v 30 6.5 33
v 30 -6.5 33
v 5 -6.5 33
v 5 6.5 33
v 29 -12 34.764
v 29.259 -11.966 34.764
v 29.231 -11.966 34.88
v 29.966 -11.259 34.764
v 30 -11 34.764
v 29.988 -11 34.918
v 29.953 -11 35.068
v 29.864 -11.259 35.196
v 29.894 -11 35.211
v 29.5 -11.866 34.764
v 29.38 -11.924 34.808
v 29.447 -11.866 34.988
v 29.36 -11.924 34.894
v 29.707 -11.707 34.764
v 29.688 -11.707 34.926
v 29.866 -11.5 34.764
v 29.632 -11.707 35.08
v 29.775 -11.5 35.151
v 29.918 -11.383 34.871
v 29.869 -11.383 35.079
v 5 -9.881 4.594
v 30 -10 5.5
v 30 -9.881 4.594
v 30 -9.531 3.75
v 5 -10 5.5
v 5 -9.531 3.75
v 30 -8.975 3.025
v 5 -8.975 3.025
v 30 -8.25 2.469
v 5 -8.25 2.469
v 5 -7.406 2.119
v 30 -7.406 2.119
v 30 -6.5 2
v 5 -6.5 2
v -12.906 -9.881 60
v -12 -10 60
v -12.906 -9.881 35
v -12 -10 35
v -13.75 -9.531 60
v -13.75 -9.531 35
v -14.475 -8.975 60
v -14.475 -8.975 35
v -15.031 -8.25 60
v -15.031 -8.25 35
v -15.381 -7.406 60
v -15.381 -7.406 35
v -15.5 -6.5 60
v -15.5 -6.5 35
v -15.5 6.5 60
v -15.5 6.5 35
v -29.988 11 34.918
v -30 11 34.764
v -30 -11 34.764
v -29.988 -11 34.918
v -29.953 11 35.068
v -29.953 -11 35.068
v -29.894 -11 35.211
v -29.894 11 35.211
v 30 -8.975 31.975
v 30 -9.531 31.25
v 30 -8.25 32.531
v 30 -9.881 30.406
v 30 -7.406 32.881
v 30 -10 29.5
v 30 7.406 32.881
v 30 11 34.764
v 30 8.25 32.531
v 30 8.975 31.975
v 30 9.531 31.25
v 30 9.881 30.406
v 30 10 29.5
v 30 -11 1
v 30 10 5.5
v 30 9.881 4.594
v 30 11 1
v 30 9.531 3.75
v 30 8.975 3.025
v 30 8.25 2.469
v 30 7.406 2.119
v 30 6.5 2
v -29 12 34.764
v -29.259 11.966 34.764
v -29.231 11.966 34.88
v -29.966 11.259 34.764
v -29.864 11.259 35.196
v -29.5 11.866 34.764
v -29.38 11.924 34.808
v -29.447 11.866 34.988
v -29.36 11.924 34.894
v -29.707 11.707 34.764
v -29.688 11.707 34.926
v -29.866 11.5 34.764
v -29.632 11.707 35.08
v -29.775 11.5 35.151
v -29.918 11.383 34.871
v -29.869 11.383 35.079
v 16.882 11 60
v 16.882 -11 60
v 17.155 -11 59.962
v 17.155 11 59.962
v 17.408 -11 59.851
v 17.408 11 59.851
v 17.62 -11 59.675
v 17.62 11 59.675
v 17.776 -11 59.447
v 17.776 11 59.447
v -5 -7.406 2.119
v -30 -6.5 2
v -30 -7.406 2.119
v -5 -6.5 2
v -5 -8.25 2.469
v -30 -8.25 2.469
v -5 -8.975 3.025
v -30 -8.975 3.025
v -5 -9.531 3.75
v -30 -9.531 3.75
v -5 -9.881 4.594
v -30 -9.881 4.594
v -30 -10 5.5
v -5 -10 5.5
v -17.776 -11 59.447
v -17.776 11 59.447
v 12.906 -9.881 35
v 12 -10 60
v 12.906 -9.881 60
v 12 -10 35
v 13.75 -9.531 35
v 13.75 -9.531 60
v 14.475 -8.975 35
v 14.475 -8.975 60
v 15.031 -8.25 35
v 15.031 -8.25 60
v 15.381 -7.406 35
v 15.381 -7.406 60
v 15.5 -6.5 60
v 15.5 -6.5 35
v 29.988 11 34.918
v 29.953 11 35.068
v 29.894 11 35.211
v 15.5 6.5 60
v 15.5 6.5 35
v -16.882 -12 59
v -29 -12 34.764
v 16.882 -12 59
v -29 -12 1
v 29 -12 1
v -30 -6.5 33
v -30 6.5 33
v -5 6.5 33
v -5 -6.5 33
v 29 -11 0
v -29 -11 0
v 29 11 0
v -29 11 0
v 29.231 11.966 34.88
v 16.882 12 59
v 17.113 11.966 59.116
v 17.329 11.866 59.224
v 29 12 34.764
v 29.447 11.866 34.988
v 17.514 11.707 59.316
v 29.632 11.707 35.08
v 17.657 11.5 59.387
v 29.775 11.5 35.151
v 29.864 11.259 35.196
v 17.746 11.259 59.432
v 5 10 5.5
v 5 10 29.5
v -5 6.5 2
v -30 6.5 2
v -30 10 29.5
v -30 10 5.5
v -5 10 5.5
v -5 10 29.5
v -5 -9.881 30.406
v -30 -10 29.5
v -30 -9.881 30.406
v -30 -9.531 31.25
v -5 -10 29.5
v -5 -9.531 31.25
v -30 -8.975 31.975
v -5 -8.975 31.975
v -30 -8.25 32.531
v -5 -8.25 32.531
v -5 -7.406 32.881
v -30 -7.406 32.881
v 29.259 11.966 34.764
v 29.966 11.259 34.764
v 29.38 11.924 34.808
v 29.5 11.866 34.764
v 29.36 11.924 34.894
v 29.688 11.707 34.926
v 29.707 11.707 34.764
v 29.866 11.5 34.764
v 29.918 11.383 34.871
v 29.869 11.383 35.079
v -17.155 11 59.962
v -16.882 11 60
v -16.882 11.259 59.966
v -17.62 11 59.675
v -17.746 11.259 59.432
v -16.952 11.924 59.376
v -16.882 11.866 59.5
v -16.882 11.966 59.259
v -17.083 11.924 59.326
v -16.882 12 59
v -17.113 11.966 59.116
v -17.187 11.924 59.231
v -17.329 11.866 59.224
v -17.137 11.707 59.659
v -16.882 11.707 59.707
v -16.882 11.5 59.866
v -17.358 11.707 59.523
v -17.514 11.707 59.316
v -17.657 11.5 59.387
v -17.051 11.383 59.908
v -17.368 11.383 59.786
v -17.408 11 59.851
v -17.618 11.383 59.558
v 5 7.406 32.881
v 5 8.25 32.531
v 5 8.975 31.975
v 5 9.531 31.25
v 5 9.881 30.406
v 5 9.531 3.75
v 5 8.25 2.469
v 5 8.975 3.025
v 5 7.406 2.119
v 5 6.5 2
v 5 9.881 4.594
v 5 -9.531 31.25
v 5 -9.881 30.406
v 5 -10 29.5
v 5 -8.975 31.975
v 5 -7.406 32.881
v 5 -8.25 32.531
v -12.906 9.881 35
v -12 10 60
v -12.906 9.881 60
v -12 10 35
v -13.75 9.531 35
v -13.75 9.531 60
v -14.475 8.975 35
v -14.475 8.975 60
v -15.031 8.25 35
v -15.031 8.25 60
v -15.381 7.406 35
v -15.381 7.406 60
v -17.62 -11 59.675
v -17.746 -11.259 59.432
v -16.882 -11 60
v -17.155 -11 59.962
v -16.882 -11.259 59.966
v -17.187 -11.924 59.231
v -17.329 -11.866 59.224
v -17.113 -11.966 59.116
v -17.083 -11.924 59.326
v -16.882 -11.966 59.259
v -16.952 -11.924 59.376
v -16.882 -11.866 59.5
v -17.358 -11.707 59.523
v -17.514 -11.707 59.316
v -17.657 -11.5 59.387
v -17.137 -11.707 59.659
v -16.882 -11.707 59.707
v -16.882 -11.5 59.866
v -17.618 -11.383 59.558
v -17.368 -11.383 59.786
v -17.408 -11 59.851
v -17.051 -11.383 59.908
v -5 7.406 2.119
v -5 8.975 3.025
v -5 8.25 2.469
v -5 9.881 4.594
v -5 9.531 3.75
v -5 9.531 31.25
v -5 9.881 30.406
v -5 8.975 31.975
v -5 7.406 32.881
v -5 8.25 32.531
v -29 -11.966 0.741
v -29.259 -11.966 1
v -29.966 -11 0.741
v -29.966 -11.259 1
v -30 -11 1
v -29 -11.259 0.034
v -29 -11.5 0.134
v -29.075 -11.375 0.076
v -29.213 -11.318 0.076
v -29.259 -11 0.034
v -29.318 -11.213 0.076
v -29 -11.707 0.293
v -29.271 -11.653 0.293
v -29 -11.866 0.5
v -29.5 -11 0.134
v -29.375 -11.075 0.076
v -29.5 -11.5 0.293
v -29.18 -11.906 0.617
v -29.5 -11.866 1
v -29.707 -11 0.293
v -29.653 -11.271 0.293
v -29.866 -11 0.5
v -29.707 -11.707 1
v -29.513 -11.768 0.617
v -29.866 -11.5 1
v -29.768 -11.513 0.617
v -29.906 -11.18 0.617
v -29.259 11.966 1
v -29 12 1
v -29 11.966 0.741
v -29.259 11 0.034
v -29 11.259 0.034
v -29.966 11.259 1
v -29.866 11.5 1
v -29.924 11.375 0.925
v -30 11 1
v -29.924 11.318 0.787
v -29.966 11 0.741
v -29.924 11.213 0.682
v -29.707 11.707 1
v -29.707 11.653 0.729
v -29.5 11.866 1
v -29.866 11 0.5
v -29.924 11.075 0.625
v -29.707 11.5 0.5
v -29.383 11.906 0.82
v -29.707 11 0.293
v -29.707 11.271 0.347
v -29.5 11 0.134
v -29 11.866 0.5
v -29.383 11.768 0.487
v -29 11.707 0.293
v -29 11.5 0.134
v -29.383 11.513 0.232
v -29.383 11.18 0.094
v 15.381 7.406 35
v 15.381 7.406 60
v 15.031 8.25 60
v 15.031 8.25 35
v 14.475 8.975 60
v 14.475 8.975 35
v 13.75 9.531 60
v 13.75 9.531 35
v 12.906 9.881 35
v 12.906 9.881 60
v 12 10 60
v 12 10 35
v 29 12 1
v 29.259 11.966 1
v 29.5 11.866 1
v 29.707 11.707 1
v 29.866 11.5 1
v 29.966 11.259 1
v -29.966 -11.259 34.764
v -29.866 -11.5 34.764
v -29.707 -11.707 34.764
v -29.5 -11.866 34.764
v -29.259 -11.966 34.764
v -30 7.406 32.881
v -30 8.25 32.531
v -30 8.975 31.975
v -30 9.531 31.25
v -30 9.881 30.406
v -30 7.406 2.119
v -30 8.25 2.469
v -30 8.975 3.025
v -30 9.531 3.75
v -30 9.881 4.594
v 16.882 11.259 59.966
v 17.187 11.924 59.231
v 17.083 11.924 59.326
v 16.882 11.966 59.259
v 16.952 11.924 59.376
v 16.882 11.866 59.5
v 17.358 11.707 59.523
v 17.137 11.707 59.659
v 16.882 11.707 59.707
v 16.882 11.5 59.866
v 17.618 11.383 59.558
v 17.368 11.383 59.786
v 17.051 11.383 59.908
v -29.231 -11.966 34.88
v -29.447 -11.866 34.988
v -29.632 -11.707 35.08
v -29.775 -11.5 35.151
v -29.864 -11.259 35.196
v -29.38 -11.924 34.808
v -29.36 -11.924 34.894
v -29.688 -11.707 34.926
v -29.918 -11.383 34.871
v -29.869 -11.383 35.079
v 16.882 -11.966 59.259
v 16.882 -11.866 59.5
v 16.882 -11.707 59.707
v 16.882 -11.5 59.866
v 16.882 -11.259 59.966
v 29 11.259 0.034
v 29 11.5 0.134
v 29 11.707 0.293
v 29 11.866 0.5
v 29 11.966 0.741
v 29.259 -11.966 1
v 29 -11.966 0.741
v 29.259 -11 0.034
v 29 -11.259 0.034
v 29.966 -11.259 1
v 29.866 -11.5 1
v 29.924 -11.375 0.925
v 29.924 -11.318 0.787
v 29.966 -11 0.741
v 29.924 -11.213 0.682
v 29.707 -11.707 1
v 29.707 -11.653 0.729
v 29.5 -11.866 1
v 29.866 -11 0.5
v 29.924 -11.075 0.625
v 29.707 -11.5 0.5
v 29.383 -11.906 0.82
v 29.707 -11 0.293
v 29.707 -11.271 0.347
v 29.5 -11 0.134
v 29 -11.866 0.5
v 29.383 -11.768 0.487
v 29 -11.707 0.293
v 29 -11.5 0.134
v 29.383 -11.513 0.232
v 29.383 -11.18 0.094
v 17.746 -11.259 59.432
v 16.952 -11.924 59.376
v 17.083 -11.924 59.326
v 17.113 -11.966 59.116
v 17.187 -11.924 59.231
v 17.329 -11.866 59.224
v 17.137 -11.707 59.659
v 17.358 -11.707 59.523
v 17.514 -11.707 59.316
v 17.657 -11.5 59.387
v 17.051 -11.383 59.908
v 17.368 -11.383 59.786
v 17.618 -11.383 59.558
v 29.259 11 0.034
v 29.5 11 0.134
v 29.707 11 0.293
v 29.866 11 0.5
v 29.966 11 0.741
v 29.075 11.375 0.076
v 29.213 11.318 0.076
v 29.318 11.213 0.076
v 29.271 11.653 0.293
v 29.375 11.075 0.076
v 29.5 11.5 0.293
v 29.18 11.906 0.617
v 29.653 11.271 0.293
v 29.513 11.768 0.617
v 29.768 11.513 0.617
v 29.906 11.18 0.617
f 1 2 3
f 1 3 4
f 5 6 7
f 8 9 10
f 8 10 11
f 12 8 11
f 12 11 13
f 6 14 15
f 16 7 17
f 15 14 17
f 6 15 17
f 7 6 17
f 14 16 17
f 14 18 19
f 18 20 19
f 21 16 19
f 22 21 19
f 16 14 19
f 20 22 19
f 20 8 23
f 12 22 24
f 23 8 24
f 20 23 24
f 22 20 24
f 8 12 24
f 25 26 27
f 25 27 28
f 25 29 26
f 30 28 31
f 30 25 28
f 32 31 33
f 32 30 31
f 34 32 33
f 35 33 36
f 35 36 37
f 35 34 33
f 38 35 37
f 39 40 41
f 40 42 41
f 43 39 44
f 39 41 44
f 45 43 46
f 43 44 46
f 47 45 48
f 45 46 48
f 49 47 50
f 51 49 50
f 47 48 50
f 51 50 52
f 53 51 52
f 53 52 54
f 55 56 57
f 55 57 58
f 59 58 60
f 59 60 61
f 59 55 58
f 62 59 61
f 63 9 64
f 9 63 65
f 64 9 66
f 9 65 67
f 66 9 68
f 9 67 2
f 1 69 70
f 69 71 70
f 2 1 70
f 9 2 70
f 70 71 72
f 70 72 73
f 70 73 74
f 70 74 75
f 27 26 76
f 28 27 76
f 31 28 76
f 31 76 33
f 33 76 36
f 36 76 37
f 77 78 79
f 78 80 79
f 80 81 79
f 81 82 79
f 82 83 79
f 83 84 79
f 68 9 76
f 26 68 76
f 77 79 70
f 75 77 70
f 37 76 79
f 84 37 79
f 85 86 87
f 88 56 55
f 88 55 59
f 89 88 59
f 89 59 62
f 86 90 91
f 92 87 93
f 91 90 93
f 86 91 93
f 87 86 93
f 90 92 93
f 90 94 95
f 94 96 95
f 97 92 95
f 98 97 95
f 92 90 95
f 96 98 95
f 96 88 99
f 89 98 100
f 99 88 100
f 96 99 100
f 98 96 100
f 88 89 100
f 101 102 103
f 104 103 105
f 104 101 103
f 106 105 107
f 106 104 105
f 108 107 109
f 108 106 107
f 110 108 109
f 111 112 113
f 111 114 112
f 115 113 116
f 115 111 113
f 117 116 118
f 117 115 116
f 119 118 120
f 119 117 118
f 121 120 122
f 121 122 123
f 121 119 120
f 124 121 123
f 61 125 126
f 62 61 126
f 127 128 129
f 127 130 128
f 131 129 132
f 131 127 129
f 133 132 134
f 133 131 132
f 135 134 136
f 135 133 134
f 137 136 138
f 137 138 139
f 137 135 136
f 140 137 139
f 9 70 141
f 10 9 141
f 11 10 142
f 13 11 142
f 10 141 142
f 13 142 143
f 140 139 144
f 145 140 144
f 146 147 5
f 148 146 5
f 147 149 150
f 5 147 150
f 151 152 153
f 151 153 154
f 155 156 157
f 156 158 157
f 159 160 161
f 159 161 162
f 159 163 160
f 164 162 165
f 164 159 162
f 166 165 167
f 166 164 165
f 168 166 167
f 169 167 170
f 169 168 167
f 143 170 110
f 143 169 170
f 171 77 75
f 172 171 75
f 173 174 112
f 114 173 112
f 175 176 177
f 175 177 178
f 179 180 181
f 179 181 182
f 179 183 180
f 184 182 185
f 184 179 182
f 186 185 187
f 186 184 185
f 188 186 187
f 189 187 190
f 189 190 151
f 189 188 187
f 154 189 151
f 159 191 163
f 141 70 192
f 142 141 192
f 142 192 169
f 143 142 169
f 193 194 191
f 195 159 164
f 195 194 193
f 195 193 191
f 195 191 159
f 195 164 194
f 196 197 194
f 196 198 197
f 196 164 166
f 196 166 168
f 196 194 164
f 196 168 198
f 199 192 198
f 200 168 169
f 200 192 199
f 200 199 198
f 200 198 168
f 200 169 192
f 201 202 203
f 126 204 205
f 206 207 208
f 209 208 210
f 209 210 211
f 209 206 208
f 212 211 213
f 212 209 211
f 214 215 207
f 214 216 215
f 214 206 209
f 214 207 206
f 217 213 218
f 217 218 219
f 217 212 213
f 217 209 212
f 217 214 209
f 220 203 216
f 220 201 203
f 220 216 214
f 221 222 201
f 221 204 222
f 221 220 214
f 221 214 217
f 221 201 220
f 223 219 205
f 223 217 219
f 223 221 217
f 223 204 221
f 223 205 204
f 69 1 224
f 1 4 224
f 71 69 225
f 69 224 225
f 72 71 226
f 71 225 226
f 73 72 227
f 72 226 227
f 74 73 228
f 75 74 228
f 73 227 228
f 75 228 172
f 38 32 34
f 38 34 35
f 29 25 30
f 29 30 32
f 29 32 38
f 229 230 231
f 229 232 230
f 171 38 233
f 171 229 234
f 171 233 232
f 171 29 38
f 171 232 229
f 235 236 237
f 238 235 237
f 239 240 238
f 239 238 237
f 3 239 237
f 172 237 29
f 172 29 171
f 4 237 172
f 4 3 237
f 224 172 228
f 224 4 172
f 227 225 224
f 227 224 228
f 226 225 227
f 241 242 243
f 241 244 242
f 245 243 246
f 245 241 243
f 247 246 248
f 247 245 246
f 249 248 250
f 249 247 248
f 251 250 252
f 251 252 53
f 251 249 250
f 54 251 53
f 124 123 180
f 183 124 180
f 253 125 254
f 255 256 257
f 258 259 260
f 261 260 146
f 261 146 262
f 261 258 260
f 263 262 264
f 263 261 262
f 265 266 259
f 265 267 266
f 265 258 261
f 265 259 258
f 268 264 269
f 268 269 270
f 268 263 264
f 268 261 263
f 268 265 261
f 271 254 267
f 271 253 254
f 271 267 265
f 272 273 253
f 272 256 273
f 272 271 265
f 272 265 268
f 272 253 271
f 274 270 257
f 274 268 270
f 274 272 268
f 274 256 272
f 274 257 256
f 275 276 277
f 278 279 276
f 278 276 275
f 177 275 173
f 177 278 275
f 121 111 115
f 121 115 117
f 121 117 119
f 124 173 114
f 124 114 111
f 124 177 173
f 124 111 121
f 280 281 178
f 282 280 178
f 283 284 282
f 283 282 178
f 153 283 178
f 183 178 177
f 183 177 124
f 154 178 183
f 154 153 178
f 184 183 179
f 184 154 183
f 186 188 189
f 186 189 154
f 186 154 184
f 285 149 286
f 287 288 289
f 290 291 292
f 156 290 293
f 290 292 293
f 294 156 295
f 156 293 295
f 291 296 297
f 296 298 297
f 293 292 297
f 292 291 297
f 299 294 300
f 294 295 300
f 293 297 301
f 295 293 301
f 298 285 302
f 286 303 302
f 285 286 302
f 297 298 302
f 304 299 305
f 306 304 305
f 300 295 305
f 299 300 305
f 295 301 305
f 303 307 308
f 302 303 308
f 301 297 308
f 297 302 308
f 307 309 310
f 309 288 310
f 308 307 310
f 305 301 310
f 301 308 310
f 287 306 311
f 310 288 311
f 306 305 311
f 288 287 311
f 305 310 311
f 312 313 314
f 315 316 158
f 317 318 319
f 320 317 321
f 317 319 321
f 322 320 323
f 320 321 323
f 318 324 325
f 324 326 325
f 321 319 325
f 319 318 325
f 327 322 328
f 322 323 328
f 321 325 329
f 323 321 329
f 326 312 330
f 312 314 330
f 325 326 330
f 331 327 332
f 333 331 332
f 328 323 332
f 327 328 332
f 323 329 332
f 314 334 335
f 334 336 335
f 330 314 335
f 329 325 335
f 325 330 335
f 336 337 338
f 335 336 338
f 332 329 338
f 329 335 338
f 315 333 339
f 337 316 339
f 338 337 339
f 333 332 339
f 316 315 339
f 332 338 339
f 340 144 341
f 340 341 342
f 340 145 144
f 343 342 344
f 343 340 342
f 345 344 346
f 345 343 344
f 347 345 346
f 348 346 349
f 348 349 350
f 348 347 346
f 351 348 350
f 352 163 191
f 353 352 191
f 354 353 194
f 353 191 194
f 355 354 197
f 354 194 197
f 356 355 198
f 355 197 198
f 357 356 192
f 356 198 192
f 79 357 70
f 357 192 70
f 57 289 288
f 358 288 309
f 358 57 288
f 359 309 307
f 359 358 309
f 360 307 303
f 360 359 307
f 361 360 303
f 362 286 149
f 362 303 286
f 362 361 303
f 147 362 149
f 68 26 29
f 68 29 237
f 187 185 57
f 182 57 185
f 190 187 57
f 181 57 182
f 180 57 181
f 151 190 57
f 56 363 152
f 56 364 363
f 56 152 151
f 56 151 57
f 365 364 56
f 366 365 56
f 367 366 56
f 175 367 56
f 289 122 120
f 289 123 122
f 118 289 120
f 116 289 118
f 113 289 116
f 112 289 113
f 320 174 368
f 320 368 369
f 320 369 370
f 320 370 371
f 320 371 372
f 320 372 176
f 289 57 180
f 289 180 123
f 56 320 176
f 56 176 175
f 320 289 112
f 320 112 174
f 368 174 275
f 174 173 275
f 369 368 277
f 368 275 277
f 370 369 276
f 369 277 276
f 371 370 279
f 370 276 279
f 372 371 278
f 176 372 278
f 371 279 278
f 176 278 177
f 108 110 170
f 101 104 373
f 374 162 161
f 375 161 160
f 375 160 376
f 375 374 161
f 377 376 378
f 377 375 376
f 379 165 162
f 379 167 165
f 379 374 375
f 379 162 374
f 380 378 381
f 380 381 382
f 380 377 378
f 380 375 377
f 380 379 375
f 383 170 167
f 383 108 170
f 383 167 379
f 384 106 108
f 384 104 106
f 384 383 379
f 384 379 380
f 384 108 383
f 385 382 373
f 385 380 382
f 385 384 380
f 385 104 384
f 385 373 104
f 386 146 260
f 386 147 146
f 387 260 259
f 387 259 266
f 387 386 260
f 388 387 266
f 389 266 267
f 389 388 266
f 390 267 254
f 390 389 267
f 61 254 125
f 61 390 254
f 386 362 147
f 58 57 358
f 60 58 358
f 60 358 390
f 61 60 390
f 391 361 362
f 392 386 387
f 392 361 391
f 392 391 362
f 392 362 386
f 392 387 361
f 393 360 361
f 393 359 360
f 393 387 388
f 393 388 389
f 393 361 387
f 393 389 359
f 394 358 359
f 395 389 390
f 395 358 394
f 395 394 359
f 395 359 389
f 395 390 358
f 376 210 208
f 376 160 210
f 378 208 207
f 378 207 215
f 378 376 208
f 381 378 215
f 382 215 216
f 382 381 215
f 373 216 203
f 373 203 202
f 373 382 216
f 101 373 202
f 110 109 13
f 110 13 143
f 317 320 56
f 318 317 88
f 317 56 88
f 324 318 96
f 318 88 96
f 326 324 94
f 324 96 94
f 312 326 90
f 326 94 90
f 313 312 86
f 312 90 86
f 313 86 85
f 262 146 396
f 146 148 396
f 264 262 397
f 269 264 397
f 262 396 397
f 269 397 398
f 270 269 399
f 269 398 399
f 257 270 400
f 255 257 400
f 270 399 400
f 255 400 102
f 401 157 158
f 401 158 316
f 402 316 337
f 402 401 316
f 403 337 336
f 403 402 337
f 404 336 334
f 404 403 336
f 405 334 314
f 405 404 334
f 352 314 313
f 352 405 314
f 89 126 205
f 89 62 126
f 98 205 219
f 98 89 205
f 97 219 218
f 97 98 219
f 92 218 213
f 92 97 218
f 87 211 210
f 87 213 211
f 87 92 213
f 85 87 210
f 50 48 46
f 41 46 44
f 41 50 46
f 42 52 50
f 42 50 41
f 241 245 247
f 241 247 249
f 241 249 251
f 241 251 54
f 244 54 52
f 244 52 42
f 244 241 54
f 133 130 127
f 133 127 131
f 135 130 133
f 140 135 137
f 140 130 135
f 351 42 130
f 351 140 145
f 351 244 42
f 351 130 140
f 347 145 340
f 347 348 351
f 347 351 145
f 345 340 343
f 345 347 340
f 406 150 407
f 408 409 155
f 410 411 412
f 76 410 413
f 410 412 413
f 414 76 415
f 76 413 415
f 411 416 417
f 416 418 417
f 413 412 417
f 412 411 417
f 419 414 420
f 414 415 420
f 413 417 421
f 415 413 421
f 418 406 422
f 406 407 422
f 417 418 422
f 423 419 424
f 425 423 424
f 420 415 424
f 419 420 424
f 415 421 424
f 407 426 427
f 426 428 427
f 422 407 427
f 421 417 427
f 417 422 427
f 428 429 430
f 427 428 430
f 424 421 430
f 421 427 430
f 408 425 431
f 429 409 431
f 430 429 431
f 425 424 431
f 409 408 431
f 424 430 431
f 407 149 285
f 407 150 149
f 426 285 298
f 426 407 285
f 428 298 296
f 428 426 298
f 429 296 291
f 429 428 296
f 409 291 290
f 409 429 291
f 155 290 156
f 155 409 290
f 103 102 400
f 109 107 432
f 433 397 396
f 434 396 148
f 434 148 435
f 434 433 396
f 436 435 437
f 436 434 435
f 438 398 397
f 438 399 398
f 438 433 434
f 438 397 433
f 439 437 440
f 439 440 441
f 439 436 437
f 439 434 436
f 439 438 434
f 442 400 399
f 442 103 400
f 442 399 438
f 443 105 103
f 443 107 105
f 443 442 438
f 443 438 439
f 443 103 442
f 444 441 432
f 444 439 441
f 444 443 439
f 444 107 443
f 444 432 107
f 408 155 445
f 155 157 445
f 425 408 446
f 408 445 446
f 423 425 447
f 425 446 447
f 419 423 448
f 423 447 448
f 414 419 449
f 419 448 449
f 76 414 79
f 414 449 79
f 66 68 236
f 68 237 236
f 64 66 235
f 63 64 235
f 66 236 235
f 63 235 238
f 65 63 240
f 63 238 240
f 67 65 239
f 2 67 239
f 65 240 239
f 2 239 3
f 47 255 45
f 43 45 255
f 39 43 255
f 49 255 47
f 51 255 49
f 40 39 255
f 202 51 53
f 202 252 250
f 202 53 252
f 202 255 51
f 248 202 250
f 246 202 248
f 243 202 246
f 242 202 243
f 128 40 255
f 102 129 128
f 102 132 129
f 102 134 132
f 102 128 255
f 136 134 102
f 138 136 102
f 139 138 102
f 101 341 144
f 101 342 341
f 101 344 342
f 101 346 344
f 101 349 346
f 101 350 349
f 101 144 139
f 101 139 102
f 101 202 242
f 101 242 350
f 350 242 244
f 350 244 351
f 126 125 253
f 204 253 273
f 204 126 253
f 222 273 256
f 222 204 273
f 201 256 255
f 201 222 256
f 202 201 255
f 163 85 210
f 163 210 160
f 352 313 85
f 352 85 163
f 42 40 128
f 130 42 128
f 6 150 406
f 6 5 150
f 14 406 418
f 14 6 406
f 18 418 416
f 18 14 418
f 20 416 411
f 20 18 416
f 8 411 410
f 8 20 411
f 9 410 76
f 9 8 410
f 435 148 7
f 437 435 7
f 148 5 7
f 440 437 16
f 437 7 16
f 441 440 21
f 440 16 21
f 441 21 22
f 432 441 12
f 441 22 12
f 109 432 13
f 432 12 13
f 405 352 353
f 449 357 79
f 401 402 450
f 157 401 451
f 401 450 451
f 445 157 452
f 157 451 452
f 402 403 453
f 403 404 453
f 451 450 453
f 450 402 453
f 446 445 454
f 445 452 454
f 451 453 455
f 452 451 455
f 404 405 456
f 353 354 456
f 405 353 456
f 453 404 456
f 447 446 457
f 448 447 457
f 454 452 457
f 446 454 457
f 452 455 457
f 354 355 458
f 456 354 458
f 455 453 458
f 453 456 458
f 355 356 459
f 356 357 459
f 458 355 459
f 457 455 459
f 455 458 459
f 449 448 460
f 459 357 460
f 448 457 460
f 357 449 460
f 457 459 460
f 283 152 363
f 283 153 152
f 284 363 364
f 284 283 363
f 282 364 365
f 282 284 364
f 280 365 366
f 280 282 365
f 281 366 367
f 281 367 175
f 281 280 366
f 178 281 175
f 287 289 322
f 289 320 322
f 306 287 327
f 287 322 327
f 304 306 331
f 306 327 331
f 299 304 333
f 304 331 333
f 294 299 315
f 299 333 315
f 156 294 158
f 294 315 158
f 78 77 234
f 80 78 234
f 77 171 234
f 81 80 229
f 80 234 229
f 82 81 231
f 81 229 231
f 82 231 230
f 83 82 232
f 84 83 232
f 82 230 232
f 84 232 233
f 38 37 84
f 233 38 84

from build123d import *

# Parameters (mm, degrees)
F0_W     = 60
F0_H     = 24
F1_DEPTH = 60
F2_W     = 31
F2_H     = 20
F5_DEPTH = 25
F4_W     = 20
F4_H     = 31
F6_DEPTH = 25
F3_W     = 20
F3_H     = 31
F7_DEPTH = 25
F8_SIZE2 = 25
F8_SIZE  = 12.5
F9_R     = 3.5
F10_R    = 1


with BuildPart() as f1:
    # F0 (on Top) → F1 (new body)
    with BuildSketch(Plane.XY):
        Rectangle(F0_W, F0_H)
    extrude(amount=F1_DEPTH)

    # F2 (on face) → F5 (cut)
    with BuildSketch(Plane.XY.offset(60)):
        Rectangle(F2_W, F2_H)
    extrude(amount=-F5_DEPTH, mode=Mode.SUBTRACT)

    # F4 (on face) → F6 (cut)
    with BuildSketch(Plane(origin=(-30, 0, 0), x_dir=(0, -1, 0), z_dir=(-1, 0, 0))):
        with Locations((0, 17.5)):
            Rectangle(F4_W, F4_H)
    extrude(amount=-F6_DEPTH, mode=Mode.SUBTRACT)

    # F3 (on face) → F7 (cut)
    with BuildSketch(Plane.YZ.offset(30)):
        with Locations((0, 17.5)):
            Rectangle(F3_W, F3_H)
    extrude(amount=-F7_DEPTH, mode=Mode.SUBTRACT)

    # F8
    f8_edges = [f1.edges().sort_by_distance(p)[0] for p in [
        (30, 0, 60),
        (-30, 0, 60),
    ]]
    f8_side = f1.faces().sort_by_distance((0, -11.35378, 60))[0]
    chamfer(f8_edges, length=F8_SIZE, length2=F8_SIZE2, reference=f8_side)

    # F9
    f9_edges = [f1.edges().sort_by_distance(p)[0] for p in [
        (-17.5, 10, 33),
        (-17.5, -10, 33),
        (-17.5, -10, 2),
        (-17.5, 10, 2),
        (15.5, -10, 47.5),
        (15.5, 10, 47.5),
        (-15.5, 10, 47.5),
        (-15.5, -10, 47.5),
        (17.5, -10, 2),
        (17.5, -10, 33),
        (17.5, 10, 33),
        (17.5, 10, 2),
    ]]
    fillet(f9_edges, radius=F9_R)

    # F10
    f10_edges = [f1.edges().sort_by_distance(p)[0] for p in [
        (-30, -12, 17.5),
        (-23.75, -12, 47.5),
        (0, -12, 0),
        (0, -12, 60),
        (30, -12, 17.5),
        (23.75, -12, 47.5),
        (30, 12, 17.5),
        (23.75, 12, 47.5),
        (0, 12, 0),
        (0, 12, 60),
        (-30, 12, 17.5),
        (-23.75, 12, 47.5),
        (30, 0, 0),
        (-30, 0, 0),
        (-17.5, 0, 60),
        (-30, 0, 35),
        (17.5, 0, 60),
        (30, 0, 35),
    ]]
    fillet(f10_edges, radius=F10_R)


solid = f1.part
